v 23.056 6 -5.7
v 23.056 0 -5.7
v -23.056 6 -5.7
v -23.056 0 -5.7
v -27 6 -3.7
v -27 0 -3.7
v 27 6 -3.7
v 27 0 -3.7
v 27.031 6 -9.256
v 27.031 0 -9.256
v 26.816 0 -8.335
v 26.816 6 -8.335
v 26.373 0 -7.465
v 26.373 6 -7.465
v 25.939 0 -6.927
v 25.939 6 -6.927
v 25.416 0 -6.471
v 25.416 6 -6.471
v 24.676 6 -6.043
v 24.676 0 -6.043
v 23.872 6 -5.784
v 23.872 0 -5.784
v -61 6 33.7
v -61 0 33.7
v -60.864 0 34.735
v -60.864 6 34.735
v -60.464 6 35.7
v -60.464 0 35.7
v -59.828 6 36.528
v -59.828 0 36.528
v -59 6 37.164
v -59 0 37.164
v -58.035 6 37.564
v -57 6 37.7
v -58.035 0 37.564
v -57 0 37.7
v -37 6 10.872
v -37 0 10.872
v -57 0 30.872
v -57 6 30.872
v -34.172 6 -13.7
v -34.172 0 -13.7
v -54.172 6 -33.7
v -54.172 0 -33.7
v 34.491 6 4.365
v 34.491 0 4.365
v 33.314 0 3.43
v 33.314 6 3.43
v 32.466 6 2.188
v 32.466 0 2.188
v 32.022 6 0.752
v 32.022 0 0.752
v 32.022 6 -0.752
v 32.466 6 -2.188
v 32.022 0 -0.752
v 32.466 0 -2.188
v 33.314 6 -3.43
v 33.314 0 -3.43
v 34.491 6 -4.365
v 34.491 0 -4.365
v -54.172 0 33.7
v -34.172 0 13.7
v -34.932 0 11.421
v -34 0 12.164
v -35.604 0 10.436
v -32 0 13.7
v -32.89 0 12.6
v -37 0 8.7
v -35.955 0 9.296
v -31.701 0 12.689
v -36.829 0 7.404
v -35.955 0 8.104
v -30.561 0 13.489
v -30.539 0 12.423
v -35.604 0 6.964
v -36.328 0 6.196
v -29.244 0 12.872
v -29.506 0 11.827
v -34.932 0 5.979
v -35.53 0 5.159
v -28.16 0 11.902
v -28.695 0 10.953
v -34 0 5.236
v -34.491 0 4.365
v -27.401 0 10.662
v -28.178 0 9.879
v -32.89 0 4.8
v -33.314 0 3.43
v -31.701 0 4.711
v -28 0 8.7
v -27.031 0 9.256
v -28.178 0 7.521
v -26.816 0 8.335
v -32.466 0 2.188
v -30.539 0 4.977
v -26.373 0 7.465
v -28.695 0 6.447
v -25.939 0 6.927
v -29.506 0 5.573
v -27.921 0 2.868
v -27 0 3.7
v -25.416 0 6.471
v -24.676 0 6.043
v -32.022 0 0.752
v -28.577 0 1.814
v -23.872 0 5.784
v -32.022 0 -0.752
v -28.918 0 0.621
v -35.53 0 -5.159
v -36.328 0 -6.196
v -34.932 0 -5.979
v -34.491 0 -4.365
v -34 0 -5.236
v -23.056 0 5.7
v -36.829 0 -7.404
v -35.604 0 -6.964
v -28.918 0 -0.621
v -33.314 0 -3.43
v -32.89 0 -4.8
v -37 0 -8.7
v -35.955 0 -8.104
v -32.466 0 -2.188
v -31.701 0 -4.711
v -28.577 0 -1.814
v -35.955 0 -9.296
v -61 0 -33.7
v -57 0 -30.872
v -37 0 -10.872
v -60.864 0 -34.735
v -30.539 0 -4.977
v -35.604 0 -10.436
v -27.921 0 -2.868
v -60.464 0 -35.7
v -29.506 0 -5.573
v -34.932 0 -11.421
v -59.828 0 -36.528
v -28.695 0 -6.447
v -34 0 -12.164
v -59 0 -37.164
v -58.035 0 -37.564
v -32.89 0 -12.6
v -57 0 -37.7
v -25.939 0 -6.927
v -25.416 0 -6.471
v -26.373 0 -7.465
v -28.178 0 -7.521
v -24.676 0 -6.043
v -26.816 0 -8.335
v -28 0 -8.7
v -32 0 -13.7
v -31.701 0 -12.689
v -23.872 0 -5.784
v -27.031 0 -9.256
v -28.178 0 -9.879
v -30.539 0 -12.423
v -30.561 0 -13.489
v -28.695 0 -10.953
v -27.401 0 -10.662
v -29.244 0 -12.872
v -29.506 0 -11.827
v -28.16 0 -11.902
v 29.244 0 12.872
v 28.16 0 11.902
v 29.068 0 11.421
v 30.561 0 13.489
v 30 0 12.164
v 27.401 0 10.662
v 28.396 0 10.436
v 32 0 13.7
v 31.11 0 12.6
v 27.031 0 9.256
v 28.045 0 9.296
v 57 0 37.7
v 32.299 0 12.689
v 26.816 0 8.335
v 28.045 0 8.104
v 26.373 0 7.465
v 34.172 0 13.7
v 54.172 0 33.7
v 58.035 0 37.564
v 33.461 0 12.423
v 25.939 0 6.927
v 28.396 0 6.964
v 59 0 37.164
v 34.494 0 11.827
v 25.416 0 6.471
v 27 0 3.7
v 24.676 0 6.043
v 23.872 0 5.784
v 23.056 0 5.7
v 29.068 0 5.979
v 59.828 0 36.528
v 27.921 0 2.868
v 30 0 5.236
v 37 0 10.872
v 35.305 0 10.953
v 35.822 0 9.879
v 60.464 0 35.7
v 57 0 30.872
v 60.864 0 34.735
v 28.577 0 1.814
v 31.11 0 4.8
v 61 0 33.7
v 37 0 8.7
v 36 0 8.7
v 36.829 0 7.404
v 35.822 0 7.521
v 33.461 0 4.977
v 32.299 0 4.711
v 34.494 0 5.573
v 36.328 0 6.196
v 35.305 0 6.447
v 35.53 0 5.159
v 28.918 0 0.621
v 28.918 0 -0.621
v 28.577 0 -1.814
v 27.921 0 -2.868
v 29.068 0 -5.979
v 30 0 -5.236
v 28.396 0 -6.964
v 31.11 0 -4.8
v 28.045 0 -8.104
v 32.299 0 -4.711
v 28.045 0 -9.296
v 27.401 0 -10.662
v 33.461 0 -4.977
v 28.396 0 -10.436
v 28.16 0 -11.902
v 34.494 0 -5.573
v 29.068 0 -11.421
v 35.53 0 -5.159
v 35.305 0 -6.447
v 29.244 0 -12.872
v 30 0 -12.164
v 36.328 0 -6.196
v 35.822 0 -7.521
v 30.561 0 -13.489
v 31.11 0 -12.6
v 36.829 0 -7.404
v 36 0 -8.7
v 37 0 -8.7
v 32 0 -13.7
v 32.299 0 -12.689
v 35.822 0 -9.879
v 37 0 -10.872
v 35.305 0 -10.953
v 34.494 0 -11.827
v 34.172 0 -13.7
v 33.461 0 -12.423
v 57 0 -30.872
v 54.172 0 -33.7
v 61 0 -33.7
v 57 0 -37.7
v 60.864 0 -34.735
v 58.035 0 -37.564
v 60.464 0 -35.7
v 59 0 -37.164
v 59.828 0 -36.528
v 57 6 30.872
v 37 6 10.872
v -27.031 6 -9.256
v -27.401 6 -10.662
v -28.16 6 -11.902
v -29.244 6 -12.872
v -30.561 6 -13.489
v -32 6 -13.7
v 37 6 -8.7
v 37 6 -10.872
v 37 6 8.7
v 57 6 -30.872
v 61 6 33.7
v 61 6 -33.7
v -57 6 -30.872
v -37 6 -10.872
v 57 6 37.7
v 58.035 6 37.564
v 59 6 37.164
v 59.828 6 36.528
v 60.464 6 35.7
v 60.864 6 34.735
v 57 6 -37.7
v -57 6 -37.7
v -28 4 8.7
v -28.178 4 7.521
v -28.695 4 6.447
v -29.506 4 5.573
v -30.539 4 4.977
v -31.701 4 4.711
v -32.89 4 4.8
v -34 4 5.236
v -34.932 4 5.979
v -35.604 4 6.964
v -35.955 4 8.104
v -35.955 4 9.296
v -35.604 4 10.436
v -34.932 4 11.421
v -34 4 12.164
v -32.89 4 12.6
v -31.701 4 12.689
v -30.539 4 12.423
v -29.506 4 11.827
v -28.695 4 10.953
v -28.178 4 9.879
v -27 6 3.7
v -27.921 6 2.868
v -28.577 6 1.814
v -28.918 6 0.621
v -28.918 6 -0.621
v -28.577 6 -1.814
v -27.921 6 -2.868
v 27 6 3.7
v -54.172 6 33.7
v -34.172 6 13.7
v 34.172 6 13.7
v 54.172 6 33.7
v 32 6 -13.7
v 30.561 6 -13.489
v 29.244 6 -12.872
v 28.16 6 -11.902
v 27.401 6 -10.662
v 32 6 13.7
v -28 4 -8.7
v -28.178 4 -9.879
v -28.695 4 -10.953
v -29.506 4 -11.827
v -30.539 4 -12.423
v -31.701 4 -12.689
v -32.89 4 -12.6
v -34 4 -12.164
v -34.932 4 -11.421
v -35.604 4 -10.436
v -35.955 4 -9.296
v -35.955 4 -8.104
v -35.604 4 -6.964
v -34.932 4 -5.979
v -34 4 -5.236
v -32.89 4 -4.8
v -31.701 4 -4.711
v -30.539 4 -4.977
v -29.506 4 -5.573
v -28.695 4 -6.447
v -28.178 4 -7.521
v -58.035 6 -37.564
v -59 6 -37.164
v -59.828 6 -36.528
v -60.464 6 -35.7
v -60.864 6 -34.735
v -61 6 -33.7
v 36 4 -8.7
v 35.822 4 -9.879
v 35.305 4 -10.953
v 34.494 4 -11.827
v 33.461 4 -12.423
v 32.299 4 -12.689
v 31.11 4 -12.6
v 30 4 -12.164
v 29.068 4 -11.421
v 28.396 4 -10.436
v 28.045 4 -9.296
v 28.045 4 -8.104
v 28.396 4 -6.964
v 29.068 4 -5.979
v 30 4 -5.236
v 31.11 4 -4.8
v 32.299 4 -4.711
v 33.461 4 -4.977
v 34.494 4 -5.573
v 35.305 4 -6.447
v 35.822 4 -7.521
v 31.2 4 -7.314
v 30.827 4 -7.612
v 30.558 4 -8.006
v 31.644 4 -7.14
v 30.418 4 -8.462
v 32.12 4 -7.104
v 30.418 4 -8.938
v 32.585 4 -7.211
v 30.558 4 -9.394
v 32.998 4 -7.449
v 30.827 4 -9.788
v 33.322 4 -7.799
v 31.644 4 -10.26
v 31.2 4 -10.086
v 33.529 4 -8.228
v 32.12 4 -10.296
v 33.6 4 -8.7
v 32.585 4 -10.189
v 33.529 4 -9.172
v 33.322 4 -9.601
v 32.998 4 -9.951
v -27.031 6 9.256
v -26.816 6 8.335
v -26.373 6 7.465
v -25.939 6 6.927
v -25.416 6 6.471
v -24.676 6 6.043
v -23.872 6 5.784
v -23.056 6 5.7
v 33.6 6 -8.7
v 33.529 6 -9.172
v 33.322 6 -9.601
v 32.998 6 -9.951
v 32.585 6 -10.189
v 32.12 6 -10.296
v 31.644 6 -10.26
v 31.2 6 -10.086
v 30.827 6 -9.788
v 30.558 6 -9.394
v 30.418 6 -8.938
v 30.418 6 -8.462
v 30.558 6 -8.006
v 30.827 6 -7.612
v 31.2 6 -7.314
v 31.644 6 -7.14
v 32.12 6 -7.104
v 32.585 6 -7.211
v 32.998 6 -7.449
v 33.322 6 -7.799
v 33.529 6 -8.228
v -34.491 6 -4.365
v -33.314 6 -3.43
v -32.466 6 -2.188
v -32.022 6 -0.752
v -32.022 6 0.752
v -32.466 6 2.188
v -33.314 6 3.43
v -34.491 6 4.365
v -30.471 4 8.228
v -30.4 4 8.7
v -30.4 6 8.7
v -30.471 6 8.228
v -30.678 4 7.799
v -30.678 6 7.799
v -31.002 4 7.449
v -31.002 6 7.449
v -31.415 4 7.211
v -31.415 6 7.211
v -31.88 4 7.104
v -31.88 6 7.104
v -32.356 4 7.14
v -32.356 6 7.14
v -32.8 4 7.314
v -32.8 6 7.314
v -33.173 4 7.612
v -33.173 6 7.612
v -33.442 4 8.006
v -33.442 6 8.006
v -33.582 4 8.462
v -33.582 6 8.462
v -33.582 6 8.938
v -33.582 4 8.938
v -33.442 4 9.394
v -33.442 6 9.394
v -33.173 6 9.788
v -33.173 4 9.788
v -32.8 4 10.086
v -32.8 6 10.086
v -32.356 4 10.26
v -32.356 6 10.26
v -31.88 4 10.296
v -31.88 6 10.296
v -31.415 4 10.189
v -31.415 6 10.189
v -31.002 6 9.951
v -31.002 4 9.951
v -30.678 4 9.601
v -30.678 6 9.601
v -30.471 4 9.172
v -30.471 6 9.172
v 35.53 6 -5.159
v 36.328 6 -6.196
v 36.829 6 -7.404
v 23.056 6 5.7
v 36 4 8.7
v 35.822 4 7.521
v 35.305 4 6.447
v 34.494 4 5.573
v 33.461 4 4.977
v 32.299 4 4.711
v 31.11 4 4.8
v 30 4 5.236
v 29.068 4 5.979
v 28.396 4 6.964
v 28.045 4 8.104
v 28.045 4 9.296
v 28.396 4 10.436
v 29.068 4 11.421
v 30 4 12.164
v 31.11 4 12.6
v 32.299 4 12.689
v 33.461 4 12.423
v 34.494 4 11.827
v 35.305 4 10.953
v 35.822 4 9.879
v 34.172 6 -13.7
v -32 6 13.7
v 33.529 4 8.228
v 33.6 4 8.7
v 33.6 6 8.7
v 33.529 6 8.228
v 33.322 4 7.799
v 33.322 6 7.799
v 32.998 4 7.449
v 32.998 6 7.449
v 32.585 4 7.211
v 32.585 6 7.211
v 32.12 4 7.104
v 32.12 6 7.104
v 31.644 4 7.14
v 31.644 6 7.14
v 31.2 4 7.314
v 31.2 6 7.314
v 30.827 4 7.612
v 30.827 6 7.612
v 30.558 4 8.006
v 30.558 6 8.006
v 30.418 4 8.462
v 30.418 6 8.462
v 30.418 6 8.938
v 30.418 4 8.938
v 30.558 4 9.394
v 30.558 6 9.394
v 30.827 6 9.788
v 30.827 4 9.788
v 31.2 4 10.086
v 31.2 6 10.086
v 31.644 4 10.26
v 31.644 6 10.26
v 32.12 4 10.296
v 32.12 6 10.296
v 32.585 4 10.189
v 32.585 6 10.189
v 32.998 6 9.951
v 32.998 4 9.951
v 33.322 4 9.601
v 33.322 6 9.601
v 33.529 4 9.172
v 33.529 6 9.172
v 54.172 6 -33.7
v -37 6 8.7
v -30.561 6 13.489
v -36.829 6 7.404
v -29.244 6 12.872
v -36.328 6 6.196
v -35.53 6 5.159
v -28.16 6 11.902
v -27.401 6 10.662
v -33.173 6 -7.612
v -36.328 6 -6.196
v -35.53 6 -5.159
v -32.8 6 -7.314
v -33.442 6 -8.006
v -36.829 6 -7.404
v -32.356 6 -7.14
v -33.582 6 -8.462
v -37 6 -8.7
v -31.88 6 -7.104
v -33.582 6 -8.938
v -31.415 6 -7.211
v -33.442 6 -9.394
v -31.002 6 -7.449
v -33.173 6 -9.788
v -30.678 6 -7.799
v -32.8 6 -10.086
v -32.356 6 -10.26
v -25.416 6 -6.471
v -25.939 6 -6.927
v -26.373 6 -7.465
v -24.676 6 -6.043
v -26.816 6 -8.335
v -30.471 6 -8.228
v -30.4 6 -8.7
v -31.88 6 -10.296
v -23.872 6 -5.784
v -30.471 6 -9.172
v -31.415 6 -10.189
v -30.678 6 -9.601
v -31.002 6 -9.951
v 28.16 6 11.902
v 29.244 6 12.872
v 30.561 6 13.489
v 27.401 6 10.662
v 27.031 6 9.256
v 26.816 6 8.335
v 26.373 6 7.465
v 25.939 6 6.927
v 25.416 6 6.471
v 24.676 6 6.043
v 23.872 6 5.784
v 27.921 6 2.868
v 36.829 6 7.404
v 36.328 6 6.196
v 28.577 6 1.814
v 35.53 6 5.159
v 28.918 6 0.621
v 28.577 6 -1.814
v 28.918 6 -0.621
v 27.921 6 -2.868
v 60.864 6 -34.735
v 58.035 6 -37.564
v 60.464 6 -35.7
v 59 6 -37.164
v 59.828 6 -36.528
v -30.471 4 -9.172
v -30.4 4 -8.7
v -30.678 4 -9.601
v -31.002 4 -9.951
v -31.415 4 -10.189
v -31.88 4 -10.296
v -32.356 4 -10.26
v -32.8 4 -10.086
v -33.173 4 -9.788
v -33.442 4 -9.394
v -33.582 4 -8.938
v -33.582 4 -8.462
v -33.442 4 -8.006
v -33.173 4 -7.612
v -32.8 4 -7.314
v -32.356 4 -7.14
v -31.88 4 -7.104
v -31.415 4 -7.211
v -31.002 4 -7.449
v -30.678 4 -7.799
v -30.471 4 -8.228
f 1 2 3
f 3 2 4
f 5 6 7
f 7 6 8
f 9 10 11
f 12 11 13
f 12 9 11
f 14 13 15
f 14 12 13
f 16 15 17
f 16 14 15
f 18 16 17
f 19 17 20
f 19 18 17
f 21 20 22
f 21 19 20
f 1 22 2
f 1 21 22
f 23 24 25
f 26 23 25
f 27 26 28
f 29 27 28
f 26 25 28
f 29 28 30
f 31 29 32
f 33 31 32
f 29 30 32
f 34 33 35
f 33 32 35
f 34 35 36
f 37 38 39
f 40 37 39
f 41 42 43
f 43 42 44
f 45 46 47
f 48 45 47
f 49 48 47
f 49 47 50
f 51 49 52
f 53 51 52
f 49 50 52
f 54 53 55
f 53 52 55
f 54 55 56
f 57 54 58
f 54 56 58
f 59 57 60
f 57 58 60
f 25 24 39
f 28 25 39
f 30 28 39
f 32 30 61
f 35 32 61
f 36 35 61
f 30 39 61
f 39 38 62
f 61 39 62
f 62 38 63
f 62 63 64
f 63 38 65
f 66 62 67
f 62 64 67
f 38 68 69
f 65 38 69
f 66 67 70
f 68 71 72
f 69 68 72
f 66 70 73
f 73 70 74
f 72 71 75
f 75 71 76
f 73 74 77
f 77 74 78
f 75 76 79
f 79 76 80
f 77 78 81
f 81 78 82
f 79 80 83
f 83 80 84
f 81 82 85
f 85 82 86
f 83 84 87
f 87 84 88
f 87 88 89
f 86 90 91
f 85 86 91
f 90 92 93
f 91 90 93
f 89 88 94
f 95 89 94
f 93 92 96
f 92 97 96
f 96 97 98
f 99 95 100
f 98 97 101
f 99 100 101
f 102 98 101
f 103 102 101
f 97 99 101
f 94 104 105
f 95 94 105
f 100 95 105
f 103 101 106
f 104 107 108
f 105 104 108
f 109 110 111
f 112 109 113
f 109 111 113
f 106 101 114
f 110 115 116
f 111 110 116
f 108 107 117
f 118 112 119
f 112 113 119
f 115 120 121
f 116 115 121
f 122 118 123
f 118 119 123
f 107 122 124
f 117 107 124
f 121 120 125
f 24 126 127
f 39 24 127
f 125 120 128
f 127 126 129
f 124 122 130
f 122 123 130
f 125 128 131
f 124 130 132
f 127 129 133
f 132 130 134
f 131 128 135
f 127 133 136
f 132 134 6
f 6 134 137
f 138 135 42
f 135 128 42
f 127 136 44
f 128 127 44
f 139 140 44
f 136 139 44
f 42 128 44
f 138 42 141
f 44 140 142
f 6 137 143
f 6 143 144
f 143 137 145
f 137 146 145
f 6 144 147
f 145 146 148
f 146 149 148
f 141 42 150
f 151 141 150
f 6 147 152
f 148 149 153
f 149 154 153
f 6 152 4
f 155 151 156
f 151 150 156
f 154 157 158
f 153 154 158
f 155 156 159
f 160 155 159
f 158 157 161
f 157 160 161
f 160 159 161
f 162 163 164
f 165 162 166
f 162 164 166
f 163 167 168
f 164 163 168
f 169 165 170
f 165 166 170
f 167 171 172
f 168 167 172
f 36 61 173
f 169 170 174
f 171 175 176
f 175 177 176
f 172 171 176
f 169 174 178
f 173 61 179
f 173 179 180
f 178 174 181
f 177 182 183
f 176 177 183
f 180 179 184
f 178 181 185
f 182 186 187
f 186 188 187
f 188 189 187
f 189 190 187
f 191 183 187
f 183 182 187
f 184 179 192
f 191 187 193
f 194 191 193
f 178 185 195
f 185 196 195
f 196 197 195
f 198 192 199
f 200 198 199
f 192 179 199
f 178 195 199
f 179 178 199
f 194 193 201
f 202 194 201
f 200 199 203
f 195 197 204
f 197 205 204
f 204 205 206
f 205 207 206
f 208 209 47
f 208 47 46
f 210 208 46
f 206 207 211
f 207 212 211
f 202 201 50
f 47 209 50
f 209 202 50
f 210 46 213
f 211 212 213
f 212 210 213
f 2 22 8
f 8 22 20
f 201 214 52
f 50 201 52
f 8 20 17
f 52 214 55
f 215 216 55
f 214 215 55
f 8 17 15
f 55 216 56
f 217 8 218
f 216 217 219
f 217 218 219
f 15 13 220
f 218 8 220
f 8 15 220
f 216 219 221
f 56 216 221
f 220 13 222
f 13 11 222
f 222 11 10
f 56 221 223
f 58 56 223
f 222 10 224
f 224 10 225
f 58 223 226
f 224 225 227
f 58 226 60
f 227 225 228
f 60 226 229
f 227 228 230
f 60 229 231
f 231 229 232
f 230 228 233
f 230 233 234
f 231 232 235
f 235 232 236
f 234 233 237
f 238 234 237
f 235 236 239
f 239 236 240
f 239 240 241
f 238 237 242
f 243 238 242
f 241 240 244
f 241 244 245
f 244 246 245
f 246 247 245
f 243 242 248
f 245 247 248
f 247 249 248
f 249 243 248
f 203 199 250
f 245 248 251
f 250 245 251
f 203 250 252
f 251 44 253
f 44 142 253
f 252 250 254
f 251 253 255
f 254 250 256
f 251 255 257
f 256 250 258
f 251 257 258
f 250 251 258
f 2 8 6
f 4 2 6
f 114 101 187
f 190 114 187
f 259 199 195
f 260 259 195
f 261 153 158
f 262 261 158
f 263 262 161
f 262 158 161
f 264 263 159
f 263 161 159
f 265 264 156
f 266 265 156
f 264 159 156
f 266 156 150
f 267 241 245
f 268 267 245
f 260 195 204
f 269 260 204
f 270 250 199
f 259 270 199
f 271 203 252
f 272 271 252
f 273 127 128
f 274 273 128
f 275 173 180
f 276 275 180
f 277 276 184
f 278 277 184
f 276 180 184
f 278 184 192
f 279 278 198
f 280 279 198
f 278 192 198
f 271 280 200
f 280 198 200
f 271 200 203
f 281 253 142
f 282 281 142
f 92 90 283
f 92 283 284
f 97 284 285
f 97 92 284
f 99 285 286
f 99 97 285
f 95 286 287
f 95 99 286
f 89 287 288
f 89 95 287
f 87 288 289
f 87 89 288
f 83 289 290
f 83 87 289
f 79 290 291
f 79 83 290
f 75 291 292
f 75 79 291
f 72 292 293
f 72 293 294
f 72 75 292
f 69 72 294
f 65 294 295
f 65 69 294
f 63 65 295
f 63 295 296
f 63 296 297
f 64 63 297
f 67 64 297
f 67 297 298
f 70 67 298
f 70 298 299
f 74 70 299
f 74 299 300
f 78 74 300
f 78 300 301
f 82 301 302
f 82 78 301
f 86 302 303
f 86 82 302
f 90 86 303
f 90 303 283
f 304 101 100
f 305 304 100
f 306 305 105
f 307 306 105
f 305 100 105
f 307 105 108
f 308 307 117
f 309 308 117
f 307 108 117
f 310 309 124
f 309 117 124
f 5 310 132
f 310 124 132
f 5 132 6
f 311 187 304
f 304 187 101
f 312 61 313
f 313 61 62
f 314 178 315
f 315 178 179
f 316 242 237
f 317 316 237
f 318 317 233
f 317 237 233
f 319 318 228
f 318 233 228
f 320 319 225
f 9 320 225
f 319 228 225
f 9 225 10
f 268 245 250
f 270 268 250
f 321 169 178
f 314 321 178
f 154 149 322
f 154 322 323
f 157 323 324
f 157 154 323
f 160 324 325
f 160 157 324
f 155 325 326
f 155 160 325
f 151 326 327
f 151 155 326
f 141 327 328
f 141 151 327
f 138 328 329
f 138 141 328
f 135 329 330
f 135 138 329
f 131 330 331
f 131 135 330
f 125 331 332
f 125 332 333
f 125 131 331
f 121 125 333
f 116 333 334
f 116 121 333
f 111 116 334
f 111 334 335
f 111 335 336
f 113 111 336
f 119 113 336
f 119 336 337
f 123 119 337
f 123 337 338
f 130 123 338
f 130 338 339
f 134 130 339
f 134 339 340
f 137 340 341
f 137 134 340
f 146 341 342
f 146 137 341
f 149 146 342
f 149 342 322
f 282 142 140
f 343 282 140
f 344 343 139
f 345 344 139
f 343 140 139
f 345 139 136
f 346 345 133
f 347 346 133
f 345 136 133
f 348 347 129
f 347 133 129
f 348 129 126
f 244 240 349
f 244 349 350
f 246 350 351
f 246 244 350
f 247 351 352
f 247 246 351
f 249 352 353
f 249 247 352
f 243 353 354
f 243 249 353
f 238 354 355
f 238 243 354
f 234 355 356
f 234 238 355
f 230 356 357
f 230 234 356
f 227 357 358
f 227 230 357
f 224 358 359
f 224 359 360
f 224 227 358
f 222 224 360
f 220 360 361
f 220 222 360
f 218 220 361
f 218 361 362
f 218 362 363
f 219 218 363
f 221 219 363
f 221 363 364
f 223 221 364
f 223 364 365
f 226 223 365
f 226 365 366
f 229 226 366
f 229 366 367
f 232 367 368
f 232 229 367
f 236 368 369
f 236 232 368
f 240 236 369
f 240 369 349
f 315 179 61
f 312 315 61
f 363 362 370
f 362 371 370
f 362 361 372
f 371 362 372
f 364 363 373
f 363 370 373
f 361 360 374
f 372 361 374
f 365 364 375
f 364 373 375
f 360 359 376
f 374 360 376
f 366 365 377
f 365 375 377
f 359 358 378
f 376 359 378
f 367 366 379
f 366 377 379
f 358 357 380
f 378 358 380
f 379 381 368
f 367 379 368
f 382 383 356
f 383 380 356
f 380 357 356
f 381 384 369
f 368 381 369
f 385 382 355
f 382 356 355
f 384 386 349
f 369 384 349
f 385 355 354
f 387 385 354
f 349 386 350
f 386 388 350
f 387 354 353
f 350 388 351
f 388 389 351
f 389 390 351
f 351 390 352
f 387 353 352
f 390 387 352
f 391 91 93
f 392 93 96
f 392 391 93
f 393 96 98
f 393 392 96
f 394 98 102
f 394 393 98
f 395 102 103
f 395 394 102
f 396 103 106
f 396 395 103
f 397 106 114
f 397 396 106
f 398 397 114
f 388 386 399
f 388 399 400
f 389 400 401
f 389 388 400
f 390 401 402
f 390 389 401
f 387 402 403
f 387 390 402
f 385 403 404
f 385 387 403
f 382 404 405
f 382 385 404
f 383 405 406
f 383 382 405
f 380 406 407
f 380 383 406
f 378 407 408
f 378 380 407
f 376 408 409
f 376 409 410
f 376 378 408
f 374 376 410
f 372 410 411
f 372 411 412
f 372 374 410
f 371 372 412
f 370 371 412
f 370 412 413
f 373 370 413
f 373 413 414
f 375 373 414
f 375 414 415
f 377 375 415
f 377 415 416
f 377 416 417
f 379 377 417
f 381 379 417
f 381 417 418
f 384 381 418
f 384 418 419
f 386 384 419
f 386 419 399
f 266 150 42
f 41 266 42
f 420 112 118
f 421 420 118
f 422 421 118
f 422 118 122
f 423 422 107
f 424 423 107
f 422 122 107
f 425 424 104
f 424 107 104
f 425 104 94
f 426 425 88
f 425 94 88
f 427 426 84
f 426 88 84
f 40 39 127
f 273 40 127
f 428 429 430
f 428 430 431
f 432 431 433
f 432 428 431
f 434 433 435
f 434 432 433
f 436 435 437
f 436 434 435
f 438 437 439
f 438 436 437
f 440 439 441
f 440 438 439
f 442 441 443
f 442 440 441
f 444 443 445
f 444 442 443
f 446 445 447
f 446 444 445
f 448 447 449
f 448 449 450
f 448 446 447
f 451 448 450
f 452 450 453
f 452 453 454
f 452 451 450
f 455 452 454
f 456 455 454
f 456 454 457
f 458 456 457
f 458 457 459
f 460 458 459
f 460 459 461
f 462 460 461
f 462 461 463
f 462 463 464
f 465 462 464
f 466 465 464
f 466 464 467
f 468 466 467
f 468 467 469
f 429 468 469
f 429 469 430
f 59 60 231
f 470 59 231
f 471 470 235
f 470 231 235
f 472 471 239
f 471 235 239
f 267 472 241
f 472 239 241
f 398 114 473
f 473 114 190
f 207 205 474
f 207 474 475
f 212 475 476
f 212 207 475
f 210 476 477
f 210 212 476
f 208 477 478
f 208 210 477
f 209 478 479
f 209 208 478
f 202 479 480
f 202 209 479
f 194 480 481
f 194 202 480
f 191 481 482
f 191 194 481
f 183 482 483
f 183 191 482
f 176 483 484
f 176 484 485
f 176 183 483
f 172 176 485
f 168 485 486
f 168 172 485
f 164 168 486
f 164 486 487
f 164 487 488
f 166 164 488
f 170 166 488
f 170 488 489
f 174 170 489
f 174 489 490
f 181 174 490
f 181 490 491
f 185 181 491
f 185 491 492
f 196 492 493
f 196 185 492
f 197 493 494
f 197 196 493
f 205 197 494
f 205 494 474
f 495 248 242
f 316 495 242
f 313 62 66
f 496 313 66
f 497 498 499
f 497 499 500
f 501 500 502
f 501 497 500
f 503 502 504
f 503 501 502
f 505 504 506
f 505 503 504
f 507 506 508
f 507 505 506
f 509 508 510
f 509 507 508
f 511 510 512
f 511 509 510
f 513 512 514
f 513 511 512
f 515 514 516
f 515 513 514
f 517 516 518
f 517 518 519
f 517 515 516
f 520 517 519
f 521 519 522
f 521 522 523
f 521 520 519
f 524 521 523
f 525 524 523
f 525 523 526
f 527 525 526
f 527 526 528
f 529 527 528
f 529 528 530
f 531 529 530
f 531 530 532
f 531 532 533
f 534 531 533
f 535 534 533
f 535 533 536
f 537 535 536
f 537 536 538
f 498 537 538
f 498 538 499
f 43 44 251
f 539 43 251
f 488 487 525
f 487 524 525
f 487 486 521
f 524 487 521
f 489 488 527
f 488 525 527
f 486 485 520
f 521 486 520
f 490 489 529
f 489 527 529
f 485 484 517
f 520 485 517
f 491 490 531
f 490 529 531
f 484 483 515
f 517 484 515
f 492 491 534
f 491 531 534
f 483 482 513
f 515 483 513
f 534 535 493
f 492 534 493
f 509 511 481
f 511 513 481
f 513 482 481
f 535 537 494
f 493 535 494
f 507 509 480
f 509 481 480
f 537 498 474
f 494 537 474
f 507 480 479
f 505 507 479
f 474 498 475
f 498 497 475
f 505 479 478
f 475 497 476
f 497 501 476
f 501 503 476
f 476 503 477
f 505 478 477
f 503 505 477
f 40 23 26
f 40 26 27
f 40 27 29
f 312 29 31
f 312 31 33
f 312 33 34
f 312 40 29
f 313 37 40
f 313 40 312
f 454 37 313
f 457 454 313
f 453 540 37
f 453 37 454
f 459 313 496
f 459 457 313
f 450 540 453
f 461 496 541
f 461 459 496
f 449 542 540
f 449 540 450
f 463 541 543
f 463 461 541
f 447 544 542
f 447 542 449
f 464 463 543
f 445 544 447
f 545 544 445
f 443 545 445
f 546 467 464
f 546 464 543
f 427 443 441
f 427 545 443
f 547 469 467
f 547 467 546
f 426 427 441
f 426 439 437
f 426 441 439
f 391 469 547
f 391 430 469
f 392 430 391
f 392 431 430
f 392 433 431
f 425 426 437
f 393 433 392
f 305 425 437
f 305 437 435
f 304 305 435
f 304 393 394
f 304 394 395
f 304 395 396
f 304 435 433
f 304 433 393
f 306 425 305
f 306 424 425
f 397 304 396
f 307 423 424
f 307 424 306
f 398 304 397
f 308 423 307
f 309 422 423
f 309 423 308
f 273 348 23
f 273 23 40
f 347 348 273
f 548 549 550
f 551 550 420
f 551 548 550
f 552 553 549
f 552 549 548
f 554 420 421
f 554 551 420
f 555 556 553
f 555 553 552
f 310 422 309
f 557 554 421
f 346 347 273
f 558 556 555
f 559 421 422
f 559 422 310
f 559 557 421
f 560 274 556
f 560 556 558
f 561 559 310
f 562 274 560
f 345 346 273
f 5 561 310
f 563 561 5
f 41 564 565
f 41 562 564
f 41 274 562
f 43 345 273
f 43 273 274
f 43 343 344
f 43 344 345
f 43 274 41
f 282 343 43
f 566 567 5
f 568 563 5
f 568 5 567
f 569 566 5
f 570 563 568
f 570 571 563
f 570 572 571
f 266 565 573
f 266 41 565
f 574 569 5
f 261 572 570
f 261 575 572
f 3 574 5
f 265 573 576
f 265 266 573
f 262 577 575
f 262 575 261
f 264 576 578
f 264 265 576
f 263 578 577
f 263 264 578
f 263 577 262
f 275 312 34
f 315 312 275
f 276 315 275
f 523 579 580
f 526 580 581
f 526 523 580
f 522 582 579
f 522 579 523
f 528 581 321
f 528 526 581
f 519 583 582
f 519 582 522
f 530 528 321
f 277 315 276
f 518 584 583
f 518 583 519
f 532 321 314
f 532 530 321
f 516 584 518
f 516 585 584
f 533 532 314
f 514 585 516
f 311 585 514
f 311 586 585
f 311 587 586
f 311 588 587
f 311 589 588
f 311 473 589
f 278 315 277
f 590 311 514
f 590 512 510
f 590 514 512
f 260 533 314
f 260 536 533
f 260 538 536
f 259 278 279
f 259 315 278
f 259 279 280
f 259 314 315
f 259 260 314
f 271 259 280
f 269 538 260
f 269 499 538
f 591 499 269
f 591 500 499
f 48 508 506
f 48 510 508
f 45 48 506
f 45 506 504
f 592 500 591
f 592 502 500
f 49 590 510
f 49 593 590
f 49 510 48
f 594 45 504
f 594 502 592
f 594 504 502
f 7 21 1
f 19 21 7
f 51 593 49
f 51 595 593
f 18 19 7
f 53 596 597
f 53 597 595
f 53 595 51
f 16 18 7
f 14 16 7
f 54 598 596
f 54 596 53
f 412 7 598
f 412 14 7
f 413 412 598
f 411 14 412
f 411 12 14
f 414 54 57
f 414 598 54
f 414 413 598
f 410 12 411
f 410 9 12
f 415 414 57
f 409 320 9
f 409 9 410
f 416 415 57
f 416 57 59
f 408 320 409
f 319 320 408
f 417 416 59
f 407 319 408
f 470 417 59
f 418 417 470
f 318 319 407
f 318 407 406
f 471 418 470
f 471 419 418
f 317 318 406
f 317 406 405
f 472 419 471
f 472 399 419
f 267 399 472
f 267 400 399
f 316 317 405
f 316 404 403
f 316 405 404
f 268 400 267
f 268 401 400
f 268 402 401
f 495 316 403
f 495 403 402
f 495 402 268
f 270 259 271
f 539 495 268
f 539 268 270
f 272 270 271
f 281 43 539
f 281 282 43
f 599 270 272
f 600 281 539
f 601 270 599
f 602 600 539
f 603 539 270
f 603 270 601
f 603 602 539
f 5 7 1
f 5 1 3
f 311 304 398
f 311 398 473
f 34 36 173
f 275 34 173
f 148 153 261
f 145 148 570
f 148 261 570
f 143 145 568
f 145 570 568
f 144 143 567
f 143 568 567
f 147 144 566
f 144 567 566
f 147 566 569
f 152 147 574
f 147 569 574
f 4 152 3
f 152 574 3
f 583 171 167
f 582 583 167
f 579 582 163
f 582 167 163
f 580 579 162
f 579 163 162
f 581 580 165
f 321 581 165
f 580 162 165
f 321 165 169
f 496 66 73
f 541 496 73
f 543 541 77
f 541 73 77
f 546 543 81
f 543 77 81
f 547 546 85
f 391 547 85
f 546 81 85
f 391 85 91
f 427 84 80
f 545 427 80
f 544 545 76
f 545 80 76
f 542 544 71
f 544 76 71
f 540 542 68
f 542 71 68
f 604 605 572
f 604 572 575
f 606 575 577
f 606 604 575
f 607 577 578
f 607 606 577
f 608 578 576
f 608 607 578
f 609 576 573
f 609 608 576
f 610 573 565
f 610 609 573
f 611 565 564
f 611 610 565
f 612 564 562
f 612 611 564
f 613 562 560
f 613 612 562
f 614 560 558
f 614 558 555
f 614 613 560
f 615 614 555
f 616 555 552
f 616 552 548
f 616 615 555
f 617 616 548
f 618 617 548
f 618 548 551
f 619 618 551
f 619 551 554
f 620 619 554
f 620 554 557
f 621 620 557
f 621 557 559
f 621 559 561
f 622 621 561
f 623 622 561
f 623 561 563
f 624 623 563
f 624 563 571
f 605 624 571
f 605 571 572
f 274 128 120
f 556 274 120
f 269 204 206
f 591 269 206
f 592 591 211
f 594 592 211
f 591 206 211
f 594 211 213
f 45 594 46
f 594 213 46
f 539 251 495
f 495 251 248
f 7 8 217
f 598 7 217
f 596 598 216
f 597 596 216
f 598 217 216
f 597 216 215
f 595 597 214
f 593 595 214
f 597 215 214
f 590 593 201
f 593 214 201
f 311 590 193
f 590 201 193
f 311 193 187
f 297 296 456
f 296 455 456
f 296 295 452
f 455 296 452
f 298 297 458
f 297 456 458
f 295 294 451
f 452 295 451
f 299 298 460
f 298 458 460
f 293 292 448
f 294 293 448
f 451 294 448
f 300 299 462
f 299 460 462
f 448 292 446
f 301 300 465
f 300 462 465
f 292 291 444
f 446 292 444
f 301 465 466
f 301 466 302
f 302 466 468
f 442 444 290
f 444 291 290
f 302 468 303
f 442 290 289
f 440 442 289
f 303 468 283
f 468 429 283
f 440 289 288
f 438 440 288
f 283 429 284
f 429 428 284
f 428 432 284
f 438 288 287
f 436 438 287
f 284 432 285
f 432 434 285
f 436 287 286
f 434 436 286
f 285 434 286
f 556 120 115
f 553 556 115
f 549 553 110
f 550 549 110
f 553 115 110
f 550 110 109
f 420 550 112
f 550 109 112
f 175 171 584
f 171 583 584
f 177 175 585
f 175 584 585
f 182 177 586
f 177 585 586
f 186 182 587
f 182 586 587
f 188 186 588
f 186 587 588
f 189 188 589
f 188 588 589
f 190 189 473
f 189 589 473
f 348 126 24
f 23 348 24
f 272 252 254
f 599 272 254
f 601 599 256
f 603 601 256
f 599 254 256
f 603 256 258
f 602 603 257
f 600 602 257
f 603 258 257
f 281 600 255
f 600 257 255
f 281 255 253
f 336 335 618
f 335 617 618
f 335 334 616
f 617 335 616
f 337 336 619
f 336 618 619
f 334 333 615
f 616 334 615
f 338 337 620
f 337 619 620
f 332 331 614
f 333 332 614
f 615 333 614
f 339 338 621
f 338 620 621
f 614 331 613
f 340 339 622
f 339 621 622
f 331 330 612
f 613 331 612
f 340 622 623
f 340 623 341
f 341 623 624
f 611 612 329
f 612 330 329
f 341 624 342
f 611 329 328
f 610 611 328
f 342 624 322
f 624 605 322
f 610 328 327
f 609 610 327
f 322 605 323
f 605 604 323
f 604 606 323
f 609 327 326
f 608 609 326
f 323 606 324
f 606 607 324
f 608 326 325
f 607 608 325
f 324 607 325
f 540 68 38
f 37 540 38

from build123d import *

# Parameters (mm, degrees)
CROQUIS1_R              = 1.6
SALIENTE_EXTRUIR1_DEPTH = 6
CROQUIS1_3_R            = 4
CROQUIS1_3_R_2          = 1.6
CORTAR_EXTRUIR1_DEPTH   = 4
REDONDEO1_R             = 4


with BuildPart() as part:
    # Croquis1 → Saliente-Extruir1 (new body)
    with BuildSketch(Plane(origin=(0, 0, 0), x_dir=(1, 0, 0), z_dir=(0, 1, 0))):
        with BuildLine():
            Line((57, 37.7), (-57, 37.7))
            ThreePointArc((-57, 37.7), (-59.828427125, 36.528427125), (-61, 33.7))
            Line((-61, 33.7), (-61, -33.7))
            ThreePointArc((-61, -33.7), (-59.828427125, -36.528427125), (-57, -37.7))
            Line((-57, -37.7), (57, -37.7))
            ThreePointArc((57, -37.7), (59.828427125, -36.528427125), (61, -33.7))
            Line((61, -33.7), (61, 33.7))
            ThreePointArc((61, 33.7), (59.828427125, 36.528427125), (57, 37.7))
        make_face()
        with BuildLine():
            Line((-57, 30.871572875), (-37, 10.871572875))
            Line((-37, 10.871572875), (-37, 8.7))
            ThreePointArc((-37, 8.7), (-36.327649298, 6.195713365), (-34.491419379, 4.36493028))
            ThreePointArc((-34.491419379, 4.36493028), (-31.965559308, 0), (-34.491419379, -4.36493028))
            ThreePointArc((-34.491419379, -4.36493028), (-36.327649298, -6.195713365), (-37, -8.7))
            Line((-37, -8.7), (-37, -10.871572875))
            Line((-37, -10.871572875), (-57, -30.871572875))
            Line((-57, -30.871572875), (-57, 30.871572875))
        make_face(mode=Mode.SUBTRACT)
        with BuildLine():
            Line((-34.171572875, 13.7), (-54.171572875, 33.7))
            Line((-54.171572875, 33.7), (54.171572875, 33.7))
            Line((54.171572875, 33.7), (34.171572875, 13.7))
            Line((34.171572875, 13.7), (32, 13.7))
            ThreePointArc((32, 13.7), (28.464466094, 12.235533906), (27, 8.7))
            Line((27, 8.7), (27, 5.7))
            Line((27, 5.7), (-27, 5.7))
            Line((-27, 5.7), (-27, 8.7))
            ThreePointArc((-27, 8.7), (-28.464466094, 12.235533906), (-32, 13.7))
            Line((-32, 13.7), (-34.171572875, 13.7))
        make_face(mode=Mode.SUBTRACT)
        with BuildLine():
            Line((-27, 3.7), (27, 3.7))
            ThreePointArc((27, 3.7), (28.961617728, 0), (27, -3.7))
            Line((27, -3.7), (-27, -3.7))
            ThreePointArc((-27, -3.7), (-28.961617728, 0), (-27, 3.7))
        make_face(mode=Mode.SUBTRACT)
        with BuildLine():
            Line((37, 8.7), (37, 10.871572875))
            Line((37, 10.871572875), (57, 30.871572875))
            Line((57, 30.871572875), (57, -30.871572875))
            Line((57, -30.871572875), (37, -10.871572875))
            Line((37, -10.871572875), (37, -8.7))
            ThreePointArc((37, -8.7), (36.327649298, -6.195713365), (34.491419379, -4.36493028))
            ThreePointArc((34.491419379, -4.36493028), (31.965559308, 0), (34.491419379, 4.36493028))
            ThreePointArc((34.491419379, 4.36493028), (36.327649298, 6.195713365), (37, 8.7))
        make_face(mode=Mode.SUBTRACT)
        with BuildLine():
            Line((32, -13.7), (34.171572875, -13.7))
            Line((34.171572875, -13.7), (54.171572875, -33.7))
            Line((54.171572875, -33.7), (-54.171572875, -33.7))
            Line((-54.171572875, -33.7), (-34.171572875, -13.7))
            Line((-34.171572875, -13.7), (-32, -13.7))
            ThreePointArc((-32, -13.7), (-28.464466094, -12.235533906), (-27, -8.7))
            Line((-27, -8.7), (-27, -5.7))
            Line((-27, -5.7), (27, -5.7))
            Line((27, -5.7), (27, -8.7))
            ThreePointArc((27, -8.7), (28.464466094, -12.235533906), (32, -13.7))
        make_face(mode=Mode.SUBTRACT)
        with Locations((32, 8.7)):
            Circle(CROQUIS1_R, mode=Mode.SUBTRACT)
        with Locations((-32, -8.7)):
            Circle(CROQUIS1_R, mode=Mode.SUBTRACT)
        with Locations((32, -8.7)):
            Circle(CROQUIS1_R, mode=Mode.SUBTRACT)
        with Locations((-32, 8.7)):
            Circle(CROQUIS1_R, mode=Mode.SUBTRACT)
    extrude(amount=SALIENTE_EXTRUIR1_DEPTH)

    # Croquis1<3> → Cortar-Extruir1 (cut)
    # profile 1 of 4: a face of its own
    with BuildSketch(Plane(origin=(0, 0, 0), x_dir=(1, 0, 0), z_dir=(0, 1, 0))):
        with Locations((-32, 8.7)):
            Circle(CROQUIS1_3_R)
        with Locations((-32, 8.7)):
            Circle(CROQUIS1_3_R_2, mode=Mode.SUBTRACT)
    # profile 2 of 4: a face of its own
    with BuildSketch(Plane(origin=(0, 0, 0), x_dir=(1, 0, 0), z_dir=(0, 1, 0))):
        with Locations((32, 8.7)):
            Circle(CROQUIS1_3_R)
        with Locations((32, 8.7)):
            Circle(CROQUIS1_3_R_2, mode=Mode.SUBTRACT)
    # profile 3 of 4: a face of its own
    with BuildSketch(Plane(origin=(0, 0, 0), x_dir=(1, 0, 0), z_dir=(0, 1, 0))):
        with Locations((32, -8.7)):
            Circle(CROQUIS1_3_R)
        with Locations((32, -8.7)):
            Circle(CROQUIS1_3_R_2, mode=Mode.SUBTRACT)
    # profile 4 of 4: a face of its own
    with BuildSketch(Plane(origin=(0, 0, 0), x_dir=(1, 0, 0), z_dir=(0, 1, 0))):
        with Locations((-32, -8.7)):
            Circle(CROQUIS1_3_R)
        with Locations((-32, -8.7)):
            Circle(CROQUIS1_3_R_2, mode=Mode.SUBTRACT)
    extrude(amount=CORTAR_EXTRUIR1_DEPTH, mode=Mode.SUBTRACT)

    # Redondeo1
    redondeo1_edges = [part.edges().sort_by_distance(p)[0] for p in [
        (27, 3, -5.7),
        (27, 3, 5.7),
        (-27, 3, -5.7),
        (-27, 3, 5.7),
    ]]
    fillet(redondeo1_edges, radius=REDONDEO1_R)


solid = part.part
